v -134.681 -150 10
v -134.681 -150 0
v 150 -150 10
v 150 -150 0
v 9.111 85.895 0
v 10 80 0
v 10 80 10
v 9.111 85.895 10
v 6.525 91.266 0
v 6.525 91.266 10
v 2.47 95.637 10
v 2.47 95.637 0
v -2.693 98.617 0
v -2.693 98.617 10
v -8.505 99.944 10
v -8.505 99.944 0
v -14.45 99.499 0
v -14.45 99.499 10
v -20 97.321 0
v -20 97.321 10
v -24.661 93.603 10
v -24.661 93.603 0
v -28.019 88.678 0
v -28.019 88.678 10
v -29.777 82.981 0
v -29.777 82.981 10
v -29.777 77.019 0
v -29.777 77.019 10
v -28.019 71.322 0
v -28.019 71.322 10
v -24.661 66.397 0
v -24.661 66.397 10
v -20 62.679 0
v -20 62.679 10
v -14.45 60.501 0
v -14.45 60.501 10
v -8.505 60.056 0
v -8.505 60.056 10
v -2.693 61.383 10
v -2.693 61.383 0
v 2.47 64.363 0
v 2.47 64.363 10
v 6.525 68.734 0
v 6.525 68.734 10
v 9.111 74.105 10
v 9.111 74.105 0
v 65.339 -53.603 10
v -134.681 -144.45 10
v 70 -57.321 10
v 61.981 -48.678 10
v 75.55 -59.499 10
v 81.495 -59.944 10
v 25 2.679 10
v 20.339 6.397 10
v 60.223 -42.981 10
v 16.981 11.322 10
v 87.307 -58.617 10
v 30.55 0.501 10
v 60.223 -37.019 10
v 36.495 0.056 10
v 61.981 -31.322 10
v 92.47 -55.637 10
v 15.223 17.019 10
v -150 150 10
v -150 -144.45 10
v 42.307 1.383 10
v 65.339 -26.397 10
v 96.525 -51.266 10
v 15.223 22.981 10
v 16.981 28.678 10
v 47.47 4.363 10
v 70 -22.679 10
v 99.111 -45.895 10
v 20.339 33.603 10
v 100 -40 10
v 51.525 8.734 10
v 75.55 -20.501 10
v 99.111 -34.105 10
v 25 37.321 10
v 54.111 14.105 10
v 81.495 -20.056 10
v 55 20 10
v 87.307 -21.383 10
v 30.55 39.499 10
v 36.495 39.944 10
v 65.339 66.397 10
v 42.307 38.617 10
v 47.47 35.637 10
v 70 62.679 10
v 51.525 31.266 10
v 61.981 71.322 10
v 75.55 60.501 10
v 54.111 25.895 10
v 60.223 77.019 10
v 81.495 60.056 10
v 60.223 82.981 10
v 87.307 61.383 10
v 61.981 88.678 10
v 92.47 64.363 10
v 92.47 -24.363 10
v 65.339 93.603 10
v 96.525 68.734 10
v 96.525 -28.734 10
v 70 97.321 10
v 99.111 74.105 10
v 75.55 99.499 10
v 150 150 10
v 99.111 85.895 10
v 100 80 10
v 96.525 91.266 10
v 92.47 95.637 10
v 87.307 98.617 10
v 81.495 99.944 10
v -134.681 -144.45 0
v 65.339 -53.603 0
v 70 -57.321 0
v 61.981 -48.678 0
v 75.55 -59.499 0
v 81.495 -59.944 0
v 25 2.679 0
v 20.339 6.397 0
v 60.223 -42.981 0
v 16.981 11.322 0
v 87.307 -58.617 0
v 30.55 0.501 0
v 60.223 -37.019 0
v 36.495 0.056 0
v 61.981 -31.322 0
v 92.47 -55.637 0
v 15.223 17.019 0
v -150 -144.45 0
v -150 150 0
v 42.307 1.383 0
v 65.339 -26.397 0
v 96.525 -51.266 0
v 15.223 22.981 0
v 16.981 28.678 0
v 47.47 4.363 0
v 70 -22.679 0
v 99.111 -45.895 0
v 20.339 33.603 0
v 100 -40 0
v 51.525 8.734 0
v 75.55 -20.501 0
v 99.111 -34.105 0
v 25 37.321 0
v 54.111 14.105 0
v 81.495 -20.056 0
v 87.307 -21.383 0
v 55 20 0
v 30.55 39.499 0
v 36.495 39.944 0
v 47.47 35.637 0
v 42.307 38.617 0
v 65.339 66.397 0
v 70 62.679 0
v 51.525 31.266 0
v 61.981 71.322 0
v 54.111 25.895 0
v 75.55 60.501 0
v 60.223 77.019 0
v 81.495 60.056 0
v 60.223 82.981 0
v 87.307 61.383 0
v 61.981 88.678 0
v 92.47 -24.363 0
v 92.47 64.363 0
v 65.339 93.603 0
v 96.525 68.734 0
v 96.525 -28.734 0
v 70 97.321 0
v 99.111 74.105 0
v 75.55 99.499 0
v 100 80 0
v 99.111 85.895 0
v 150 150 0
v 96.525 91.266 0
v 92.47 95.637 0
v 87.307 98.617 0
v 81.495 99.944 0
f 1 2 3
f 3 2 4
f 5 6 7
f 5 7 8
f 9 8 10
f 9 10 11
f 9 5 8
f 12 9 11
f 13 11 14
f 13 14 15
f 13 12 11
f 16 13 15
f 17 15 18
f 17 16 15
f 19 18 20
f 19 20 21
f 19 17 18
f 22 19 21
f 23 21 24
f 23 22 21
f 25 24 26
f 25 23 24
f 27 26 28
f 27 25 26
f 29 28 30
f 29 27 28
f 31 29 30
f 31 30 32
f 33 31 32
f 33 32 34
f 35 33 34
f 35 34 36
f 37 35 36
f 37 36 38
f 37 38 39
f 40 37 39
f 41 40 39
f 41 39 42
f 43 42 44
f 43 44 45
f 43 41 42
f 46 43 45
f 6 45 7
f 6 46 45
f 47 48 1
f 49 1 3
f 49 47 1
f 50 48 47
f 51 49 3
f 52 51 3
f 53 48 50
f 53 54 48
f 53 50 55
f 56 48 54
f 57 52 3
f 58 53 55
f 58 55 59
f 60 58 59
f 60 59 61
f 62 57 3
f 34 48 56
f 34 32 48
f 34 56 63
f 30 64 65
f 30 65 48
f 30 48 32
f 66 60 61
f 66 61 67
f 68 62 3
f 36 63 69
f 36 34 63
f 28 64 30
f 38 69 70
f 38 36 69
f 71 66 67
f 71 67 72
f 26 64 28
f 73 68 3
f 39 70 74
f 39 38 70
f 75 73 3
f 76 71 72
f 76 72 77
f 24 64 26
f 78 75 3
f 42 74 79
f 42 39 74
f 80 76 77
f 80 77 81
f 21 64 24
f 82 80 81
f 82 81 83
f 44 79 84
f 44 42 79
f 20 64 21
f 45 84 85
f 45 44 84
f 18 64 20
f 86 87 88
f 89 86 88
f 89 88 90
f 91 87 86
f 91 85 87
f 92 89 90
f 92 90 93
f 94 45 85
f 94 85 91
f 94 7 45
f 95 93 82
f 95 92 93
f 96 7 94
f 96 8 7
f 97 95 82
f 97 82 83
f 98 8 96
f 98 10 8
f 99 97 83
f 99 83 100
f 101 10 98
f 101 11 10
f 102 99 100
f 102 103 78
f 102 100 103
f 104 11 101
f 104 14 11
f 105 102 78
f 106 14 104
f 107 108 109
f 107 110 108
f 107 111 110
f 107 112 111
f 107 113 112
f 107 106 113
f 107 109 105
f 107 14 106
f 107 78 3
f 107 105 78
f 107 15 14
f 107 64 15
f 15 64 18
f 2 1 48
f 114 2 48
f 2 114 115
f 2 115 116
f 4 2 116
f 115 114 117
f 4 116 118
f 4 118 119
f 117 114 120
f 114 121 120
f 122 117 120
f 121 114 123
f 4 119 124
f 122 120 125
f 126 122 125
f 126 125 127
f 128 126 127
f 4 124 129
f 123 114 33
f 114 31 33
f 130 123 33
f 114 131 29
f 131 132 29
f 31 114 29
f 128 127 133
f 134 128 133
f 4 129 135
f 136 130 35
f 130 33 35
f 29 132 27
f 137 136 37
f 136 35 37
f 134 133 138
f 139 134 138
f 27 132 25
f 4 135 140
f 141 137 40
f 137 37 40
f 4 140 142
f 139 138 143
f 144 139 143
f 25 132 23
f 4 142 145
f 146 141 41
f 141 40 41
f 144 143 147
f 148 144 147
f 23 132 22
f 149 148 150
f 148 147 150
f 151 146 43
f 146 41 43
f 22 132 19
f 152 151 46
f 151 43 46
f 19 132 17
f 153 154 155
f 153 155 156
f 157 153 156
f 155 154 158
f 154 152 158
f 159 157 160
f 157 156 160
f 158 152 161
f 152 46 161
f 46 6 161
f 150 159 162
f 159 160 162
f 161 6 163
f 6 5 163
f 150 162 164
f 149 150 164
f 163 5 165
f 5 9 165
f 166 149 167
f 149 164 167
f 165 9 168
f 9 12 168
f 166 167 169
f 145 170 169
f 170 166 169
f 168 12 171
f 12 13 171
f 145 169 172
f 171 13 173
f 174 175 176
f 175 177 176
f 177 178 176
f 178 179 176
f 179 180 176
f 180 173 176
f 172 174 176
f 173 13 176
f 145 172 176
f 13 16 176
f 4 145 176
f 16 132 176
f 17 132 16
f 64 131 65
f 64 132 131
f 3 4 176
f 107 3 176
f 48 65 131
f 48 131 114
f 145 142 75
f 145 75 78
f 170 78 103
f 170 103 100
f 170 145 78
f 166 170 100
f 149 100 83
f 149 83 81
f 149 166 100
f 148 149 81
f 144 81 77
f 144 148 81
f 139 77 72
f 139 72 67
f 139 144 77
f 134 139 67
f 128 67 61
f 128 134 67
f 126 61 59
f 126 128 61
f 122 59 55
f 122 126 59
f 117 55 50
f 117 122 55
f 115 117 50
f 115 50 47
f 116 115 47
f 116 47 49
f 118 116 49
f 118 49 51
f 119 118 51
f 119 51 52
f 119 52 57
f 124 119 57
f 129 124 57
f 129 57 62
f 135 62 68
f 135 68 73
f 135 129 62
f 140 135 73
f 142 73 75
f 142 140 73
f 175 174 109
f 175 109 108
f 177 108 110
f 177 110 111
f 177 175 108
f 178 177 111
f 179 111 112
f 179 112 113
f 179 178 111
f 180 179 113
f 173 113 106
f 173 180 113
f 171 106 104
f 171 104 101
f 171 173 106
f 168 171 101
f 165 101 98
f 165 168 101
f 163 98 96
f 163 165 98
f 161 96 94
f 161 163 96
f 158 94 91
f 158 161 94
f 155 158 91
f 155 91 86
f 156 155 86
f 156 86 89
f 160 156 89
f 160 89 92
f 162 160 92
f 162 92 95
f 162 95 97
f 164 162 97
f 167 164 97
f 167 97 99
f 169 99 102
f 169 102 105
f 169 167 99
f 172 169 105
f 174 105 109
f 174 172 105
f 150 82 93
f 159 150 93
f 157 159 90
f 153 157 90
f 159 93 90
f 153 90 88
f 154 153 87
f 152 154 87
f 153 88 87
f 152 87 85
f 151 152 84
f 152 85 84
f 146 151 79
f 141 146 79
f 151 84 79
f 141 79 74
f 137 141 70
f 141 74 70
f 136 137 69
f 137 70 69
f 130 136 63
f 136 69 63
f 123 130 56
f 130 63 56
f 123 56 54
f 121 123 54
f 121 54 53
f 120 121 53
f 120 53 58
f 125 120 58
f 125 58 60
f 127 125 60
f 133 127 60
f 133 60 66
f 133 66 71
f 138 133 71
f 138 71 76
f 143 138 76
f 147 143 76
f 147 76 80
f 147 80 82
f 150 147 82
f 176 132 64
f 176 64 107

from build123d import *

# Parameters (mm, degrees)
SKETCH_1_W          = 300
SKETCH_1_H          = 300
EXTRUDE_1_DEPTH     = 10
SKETCH_2_R          = 20
CUT_EXTRUDE_1_DEPTH = 213.367605816
SKETCH_3_R          = 20
CUT_EXTRUDE_2_DEPTH = 10
SKETCH_4_W          = 35.387588736
SKETCH_4_H          = 35.350682188
CUT_EXTRUDE_3_DEPTH = 25
SKETCH_5_W          = 15.318794368
SKETCH_5_H          = 10
EXTRUDE_2_DEPTH     = 24.5


with BuildPart() as part:
    # 草图1 → 凸台-拉伸1 (new body)
    with BuildSketch(Plane.XY):
        Rectangle(SKETCH_1_W, SKETCH_1_H)
    extrude(amount=EXTRUDE_1_DEPTH)

    # 草图2 → 切除-拉伸1 (cut, through all)
    with BuildSketch(Plane.XY.offset(10)):
        with Locations((35, 20)):
            Circle(SKETCH_2_R)
    extrude(amount=-CUT_EXTRUDE_1_DEPTH, mode=Mode.SUBTRACT)

    # 草图3 → 切除-拉伸2 (cut)
    with BuildSketch(Plane.XY):
        with Locations((80, 80)):
            Circle(SKETCH_3_R)
        with Locations((80, -40)):
            Circle(SKETCH_3_R)
        with Locations((-10, 80)):
            Circle(SKETCH_3_R)
    extrude(amount=CUT_EXTRUDE_2_DEPTH, mode=Mode.SUBTRACT)

    # 草图4 → 切除-拉伸3 (cut)
    with BuildSketch(Plane.XY.offset(10)):
        with Locations((-152.375, -137.625)):
            Rectangle(SKETCH_4_W, SKETCH_4_H)
    extrude(amount=-CUT_EXTRUDE_3_DEPTH, mode=Mode.SUBTRACT)

    # 草图5 → 凸台-拉伸2 (add)
    with BuildSketch(Plane.XZ.offset(119.949658906)):
        with Locations((-142.340602816, 5)):
            Rectangle(SKETCH_5_W, SKETCH_5_H)
    extrude(amount=EXTRUDE_2_DEPTH)


solid = part.part
